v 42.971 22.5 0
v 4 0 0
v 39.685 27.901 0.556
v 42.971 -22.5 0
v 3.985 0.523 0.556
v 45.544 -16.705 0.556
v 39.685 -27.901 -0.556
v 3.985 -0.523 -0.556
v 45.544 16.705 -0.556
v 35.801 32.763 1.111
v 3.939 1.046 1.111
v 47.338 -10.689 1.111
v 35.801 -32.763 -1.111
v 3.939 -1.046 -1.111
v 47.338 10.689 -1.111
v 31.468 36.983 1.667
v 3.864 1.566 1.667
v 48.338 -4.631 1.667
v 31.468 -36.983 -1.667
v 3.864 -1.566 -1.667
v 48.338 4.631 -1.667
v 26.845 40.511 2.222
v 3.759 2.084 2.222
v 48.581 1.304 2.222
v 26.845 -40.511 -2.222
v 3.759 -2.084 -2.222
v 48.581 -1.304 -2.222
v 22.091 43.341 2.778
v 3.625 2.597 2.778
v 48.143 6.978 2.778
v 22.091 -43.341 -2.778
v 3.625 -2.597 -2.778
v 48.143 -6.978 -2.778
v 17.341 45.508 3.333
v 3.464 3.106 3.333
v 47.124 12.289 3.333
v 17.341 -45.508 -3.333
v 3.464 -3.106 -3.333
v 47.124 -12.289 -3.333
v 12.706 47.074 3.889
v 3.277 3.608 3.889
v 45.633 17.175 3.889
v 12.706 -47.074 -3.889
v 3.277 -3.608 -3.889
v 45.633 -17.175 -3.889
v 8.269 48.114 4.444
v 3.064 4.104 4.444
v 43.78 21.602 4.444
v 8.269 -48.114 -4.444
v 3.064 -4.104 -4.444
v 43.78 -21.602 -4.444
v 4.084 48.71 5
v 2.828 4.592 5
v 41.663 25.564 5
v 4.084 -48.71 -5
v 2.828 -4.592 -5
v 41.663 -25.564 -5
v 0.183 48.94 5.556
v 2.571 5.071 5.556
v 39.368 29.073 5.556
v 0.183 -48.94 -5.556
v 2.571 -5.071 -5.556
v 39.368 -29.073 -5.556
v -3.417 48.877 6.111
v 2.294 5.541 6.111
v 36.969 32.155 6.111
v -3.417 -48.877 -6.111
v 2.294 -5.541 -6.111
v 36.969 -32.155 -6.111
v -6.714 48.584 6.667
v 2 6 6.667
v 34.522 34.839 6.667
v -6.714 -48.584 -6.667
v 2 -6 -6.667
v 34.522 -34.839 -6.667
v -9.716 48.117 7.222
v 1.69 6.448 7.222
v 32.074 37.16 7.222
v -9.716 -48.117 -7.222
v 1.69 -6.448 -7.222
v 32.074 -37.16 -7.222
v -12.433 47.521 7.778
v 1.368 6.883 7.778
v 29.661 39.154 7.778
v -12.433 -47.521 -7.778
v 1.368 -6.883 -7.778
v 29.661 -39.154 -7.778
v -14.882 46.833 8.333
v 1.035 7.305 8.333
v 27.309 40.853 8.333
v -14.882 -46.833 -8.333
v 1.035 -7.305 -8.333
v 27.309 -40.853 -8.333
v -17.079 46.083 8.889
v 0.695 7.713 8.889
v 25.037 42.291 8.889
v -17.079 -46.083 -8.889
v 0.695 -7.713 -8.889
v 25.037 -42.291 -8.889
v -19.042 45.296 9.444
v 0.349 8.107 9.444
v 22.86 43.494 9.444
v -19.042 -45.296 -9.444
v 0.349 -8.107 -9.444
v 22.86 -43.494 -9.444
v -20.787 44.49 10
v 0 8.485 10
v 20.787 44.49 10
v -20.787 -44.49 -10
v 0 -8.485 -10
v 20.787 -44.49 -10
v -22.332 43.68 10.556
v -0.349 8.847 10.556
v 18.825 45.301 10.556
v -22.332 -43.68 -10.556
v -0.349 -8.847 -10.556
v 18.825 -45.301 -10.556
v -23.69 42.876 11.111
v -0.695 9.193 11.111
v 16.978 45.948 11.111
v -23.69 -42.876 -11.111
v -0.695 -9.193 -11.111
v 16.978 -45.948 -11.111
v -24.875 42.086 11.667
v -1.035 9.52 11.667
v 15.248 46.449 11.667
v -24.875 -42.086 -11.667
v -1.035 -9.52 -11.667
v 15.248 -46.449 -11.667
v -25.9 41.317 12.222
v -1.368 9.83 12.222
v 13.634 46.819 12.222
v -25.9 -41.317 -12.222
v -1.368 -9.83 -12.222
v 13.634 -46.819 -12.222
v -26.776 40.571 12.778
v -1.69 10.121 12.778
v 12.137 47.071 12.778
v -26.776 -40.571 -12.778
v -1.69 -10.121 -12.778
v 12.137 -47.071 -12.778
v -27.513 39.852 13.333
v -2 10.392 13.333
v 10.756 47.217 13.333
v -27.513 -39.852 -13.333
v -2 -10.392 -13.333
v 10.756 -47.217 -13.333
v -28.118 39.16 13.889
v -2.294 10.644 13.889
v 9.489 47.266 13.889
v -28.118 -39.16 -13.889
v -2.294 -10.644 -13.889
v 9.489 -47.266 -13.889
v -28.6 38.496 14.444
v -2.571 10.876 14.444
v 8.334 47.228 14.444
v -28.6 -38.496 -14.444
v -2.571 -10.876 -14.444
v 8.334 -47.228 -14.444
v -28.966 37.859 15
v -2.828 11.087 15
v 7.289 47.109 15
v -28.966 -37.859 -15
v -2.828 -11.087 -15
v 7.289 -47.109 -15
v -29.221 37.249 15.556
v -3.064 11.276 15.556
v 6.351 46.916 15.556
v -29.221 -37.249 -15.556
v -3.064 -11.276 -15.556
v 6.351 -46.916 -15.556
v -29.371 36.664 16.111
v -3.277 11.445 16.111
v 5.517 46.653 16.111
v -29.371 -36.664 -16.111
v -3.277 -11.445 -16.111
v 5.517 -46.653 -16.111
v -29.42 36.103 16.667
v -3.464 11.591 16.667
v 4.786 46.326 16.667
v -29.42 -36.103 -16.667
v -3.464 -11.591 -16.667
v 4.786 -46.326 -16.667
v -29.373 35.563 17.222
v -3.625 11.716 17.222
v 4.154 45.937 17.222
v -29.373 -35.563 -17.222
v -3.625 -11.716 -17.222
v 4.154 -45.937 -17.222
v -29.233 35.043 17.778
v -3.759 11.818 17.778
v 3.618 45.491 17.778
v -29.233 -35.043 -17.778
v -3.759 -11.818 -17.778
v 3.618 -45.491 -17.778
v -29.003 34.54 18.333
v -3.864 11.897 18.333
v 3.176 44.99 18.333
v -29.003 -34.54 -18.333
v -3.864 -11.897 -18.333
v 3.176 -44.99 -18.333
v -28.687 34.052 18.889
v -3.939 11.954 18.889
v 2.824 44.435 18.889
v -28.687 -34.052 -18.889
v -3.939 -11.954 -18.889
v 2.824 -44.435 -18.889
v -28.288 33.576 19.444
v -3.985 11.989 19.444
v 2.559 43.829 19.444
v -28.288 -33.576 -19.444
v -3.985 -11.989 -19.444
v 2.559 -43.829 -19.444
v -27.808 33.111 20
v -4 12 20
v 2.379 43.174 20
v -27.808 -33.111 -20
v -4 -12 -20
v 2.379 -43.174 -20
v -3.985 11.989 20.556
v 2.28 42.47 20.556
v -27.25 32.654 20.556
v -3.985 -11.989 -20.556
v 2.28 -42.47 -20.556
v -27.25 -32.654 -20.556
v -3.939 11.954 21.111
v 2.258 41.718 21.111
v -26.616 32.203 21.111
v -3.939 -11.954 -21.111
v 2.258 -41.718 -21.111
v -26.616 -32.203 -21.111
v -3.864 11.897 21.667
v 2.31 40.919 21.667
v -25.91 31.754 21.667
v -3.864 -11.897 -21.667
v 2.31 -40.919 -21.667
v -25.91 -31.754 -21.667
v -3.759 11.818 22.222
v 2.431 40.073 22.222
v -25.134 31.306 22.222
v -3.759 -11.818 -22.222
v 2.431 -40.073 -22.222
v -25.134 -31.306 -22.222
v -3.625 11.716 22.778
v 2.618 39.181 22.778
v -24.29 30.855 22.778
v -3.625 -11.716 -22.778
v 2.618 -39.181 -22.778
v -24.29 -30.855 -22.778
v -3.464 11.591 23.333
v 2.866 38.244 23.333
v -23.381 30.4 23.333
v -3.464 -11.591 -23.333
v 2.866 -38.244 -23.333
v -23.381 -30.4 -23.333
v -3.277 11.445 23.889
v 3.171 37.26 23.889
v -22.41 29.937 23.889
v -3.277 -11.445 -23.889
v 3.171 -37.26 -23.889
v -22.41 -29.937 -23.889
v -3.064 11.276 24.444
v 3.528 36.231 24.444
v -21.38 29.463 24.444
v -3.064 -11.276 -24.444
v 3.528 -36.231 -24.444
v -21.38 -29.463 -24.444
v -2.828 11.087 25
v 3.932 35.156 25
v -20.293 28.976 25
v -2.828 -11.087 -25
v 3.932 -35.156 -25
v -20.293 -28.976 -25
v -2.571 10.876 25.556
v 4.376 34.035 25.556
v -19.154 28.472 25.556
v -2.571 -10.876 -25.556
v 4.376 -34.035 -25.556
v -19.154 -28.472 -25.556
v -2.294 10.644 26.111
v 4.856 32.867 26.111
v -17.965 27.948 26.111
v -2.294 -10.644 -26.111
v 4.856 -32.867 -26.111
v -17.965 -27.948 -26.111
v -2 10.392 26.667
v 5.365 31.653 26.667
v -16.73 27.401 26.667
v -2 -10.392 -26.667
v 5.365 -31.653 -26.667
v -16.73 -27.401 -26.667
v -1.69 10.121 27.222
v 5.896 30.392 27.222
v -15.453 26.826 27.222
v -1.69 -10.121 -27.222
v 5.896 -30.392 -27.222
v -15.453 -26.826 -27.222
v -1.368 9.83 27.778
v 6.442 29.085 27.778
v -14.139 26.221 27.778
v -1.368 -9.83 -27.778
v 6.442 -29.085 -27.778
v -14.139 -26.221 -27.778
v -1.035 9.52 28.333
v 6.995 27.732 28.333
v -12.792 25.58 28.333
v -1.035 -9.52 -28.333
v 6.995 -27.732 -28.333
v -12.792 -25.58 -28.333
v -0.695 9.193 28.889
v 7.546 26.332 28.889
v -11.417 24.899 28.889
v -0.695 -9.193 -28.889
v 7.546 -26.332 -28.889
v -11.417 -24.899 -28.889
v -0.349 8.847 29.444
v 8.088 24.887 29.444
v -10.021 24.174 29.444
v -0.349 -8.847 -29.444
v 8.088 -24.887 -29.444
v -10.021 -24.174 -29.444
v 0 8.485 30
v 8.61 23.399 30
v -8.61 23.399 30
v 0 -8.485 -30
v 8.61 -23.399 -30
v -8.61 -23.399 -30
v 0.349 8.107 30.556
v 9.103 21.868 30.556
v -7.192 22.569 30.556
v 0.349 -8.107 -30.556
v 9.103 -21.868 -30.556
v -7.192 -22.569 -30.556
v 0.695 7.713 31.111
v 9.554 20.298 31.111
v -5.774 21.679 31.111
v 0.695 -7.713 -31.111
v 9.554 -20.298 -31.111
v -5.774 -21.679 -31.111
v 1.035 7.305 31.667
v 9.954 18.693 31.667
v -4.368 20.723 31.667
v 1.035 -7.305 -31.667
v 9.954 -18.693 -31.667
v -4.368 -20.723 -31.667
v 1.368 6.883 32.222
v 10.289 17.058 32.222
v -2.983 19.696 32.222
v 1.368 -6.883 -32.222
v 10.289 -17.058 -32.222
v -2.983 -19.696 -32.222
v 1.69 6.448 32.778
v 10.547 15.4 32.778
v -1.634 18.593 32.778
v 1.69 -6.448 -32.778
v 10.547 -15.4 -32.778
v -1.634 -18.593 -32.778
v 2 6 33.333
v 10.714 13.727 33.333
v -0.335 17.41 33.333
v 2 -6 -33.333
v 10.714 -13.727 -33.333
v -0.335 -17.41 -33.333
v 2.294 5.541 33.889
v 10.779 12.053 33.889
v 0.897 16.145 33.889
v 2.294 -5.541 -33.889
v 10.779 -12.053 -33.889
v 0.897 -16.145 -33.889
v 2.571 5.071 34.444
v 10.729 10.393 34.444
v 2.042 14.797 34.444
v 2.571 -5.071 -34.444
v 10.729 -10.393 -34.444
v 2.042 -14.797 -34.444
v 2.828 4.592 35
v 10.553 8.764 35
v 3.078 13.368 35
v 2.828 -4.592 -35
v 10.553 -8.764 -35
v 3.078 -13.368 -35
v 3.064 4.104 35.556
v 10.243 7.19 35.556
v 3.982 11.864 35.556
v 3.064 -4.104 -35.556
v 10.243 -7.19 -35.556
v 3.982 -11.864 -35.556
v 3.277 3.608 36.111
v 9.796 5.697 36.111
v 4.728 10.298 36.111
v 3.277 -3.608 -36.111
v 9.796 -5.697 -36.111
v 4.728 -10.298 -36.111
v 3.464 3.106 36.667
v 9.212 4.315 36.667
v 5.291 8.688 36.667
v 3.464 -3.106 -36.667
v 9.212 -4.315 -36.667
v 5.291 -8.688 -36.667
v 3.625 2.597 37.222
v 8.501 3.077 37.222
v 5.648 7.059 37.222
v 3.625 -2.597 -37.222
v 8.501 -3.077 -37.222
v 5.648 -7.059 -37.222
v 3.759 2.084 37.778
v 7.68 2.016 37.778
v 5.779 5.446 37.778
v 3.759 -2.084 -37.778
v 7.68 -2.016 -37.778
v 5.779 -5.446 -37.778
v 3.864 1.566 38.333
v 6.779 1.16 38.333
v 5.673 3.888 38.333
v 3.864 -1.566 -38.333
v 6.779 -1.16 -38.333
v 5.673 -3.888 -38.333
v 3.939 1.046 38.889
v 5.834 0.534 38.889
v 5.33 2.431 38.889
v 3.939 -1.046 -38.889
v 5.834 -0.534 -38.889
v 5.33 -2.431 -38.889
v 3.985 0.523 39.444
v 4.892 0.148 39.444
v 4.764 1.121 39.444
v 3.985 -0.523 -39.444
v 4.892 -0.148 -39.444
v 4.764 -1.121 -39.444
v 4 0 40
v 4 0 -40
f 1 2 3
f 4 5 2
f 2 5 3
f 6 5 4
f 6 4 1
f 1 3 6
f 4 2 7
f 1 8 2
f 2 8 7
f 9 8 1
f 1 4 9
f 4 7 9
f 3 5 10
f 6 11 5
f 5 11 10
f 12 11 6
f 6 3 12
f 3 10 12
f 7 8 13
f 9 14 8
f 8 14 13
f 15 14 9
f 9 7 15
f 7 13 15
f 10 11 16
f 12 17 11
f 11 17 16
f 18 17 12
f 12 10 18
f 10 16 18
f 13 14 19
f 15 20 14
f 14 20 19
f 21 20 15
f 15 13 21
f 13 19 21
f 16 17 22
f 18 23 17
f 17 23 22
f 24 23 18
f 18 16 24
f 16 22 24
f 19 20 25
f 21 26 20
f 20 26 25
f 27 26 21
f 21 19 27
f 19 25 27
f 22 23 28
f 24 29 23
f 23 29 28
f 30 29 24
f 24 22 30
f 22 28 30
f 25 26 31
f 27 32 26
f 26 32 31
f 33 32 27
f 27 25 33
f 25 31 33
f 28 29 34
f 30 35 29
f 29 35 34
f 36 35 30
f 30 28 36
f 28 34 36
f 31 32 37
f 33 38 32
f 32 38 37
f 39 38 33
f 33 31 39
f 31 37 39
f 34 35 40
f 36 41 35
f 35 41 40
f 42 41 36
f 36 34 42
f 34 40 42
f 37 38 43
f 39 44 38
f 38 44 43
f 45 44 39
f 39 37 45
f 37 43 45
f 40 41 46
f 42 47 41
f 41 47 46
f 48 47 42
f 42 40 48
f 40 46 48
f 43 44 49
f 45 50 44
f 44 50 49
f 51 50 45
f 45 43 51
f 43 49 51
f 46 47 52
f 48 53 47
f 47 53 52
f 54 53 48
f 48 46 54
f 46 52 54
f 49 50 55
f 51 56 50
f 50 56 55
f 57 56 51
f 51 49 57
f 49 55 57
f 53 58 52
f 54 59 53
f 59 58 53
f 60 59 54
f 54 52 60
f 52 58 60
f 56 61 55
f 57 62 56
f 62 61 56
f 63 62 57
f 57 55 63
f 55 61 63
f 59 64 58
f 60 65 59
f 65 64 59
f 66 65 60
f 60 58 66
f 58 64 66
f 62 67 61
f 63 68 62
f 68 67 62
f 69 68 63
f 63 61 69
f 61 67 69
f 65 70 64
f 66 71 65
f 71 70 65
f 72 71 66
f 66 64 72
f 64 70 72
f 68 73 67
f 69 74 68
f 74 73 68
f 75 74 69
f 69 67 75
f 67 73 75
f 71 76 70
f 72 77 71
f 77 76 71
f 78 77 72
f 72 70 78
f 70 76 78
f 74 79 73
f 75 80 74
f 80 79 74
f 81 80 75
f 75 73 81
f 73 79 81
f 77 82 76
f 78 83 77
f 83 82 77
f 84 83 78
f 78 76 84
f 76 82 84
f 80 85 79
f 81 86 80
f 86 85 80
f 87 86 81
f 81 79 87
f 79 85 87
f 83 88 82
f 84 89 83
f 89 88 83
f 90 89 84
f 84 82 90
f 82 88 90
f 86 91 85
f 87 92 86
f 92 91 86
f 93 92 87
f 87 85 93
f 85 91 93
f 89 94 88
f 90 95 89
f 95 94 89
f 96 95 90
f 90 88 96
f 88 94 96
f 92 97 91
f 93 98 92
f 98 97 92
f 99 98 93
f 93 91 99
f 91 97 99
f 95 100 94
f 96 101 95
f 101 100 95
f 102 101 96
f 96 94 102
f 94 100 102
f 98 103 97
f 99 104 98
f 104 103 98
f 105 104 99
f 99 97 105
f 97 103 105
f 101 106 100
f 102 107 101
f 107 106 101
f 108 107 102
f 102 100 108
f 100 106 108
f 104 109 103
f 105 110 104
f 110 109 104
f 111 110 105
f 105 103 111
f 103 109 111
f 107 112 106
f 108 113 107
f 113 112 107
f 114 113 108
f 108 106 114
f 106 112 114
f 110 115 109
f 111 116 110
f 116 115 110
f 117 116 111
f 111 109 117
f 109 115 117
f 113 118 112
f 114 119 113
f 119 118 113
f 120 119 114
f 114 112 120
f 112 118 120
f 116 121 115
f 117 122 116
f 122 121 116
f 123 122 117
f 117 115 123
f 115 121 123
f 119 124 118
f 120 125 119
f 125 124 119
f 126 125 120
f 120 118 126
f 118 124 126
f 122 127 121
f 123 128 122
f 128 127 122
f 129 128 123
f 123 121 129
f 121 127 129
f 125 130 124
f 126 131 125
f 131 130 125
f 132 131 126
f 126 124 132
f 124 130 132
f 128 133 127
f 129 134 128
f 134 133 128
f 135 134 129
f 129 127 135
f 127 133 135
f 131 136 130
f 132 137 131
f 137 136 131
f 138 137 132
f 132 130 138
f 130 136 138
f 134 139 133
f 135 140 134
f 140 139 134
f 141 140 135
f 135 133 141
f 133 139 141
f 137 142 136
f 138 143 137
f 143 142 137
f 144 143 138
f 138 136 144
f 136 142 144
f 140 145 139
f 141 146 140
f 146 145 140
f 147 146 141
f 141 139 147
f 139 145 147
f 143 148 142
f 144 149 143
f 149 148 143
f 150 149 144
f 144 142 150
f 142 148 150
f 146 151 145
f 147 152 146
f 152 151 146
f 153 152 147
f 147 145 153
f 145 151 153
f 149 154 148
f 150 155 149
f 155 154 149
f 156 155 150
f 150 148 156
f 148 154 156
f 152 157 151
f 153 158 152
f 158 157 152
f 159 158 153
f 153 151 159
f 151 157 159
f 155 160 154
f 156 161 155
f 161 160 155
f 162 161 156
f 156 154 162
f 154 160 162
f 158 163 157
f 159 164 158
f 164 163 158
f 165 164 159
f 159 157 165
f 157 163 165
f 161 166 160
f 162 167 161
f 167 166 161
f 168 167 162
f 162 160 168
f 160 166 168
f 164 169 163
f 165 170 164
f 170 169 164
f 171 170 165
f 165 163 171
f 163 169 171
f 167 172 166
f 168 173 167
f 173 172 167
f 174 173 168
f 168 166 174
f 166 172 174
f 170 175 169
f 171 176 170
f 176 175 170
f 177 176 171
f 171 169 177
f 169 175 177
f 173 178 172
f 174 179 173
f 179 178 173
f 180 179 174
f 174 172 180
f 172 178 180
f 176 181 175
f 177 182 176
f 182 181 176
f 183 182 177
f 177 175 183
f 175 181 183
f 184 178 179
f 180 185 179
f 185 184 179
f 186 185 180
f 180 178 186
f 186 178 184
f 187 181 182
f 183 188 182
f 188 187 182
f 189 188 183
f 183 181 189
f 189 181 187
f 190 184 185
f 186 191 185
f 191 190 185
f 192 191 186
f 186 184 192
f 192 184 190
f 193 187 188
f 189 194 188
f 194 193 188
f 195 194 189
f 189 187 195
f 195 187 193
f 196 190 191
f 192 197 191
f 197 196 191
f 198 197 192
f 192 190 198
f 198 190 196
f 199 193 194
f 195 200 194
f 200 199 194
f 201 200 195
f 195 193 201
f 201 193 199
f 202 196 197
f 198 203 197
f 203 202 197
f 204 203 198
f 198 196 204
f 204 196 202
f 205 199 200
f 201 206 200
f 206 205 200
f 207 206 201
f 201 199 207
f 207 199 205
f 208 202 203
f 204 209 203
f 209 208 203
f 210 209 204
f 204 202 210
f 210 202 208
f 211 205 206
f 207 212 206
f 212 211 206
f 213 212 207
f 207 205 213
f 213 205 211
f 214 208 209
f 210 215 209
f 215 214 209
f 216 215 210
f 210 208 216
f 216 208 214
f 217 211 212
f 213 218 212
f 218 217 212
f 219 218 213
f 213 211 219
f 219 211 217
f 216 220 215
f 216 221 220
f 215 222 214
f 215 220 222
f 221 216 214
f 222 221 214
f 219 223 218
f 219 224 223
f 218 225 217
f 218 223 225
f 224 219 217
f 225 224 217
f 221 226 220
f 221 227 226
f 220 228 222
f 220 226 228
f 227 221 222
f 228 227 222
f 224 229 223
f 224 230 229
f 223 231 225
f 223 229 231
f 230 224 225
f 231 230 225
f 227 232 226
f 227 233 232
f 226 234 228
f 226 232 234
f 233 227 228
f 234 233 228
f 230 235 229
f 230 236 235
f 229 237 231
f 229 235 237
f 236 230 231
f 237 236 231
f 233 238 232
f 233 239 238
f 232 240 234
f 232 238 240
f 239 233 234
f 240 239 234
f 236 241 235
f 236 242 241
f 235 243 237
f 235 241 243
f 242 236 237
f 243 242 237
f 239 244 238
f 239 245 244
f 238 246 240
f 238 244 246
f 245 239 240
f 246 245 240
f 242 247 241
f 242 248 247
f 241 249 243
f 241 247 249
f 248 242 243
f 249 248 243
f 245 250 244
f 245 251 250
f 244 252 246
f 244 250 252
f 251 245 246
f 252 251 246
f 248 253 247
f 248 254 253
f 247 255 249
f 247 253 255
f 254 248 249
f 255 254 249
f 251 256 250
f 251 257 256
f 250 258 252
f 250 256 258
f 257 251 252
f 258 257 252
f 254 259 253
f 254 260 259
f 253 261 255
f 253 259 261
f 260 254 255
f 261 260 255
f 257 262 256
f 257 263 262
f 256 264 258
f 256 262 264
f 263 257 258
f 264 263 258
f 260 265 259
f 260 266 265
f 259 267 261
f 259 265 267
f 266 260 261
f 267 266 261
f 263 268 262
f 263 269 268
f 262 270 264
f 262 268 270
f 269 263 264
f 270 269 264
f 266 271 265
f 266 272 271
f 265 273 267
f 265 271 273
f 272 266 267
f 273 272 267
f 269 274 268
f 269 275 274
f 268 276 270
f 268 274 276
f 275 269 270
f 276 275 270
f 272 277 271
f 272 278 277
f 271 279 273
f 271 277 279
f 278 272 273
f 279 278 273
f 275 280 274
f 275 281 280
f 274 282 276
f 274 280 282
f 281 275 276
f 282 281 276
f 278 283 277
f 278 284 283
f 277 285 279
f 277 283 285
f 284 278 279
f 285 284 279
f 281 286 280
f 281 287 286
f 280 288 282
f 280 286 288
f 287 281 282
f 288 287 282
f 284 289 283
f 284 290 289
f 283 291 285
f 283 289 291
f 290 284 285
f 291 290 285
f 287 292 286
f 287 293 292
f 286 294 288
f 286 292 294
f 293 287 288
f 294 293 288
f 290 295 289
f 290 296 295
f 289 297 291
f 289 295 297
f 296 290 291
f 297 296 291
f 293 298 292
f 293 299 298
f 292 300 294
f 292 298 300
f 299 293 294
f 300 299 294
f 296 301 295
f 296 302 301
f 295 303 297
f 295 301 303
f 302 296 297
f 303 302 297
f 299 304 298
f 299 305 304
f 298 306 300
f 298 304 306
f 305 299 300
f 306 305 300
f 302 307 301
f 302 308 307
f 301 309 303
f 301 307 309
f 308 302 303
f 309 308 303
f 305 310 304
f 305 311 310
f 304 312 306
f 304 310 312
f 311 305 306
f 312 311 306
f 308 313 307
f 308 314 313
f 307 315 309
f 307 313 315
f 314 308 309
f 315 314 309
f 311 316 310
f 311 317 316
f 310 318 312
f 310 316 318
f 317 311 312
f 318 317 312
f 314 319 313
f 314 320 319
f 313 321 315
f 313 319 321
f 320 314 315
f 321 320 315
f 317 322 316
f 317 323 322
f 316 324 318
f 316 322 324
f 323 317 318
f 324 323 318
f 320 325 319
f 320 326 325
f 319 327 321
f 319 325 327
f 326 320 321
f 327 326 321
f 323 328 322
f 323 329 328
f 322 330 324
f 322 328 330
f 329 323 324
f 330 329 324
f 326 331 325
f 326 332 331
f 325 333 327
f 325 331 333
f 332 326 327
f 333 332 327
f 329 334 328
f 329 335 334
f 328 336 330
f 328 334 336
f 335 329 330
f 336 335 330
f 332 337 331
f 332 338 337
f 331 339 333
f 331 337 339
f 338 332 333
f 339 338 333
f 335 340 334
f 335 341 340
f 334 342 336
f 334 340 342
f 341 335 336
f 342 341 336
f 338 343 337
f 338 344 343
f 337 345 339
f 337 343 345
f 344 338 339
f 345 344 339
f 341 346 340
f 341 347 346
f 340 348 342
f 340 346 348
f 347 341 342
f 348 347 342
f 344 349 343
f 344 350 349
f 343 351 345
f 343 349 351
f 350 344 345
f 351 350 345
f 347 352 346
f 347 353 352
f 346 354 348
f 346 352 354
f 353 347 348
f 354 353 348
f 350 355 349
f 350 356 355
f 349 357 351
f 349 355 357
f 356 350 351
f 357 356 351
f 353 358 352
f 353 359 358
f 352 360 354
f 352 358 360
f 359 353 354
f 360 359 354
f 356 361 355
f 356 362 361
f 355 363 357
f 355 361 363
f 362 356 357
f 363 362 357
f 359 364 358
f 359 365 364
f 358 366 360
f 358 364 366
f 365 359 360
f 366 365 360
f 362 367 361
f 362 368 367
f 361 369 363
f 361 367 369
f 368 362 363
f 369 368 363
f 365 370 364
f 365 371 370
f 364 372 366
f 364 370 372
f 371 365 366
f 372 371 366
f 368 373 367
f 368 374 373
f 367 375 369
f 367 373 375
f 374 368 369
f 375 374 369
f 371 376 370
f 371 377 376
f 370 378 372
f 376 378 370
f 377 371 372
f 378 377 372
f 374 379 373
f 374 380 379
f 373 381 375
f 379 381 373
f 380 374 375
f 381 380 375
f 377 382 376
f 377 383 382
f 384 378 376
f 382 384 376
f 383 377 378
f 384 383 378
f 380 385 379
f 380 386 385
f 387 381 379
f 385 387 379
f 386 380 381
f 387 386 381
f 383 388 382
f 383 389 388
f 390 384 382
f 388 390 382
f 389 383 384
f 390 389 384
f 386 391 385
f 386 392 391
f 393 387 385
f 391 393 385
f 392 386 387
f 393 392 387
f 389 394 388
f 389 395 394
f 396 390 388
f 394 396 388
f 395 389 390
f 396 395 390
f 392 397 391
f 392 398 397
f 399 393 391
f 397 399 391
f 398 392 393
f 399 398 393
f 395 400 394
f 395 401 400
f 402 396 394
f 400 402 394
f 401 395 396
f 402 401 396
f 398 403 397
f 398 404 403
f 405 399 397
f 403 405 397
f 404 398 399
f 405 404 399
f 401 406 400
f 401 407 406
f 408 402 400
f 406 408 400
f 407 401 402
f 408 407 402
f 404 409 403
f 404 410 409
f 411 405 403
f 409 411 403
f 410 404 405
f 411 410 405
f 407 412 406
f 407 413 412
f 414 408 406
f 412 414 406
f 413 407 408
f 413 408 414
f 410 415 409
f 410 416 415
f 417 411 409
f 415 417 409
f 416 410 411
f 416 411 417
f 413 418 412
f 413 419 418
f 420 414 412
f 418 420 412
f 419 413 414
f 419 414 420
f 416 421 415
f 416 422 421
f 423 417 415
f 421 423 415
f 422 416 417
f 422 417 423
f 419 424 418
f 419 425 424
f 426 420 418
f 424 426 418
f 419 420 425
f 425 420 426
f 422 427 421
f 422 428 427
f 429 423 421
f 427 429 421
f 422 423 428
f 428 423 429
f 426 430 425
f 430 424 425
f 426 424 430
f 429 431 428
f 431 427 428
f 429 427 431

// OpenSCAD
scale=2.5;

steps=72;

module slice(Xa, Ya, Za, Xb, Yb, Zb, radiusa, radiusb, bend)
{	
	angleZ=atan2(Ya, Xa);
	twistZ=atan2(Yb, Xb)-atan2(Ya, Xa);

	polyPoints=[
		[Xa,						Ya,					Za ],
		[Xa+ radiusa*cos(30+angleZ),		Ya+ radiusa*sin(30+angleZ),	Za ],
		[Xa+ radiusa*cos(-30+angleZ),	Ya+ radiusa*sin(-30+angleZ),	Za ],
	
		[Xb,							Yb,							Zb ],
		[Xb+ radiusb*cos(30+angleZ+twistZ),	Yb+ radiusb*sin(30+angleZ+twistZ),		Zb+ radiusb*sin(bend) ],
		[Xb+ radiusb*cos(-30+angleZ+twistZ),	Yb+ radiusb*sin(-30+angleZ+twistZ),	Zb+ radiusb*sin(bend)] ];
	
	polyTriangles=[
		[ 0, 2, 1 ],
	
		[ 3, 2, 0], [ 2, 3, 5],
	
		[ 4, 0, 1], [ 0, 4, 3],
	
		[ 5, 1, 2], [ 1, 5, 4],
	
		[ 3, 4, 5 ]
		 ];
	
	polyhedron( polyPoints, polyTriangles );
}

function 	X(i)=		4*cos(i*360);
function 	Y(i)=		12*sin(i*180);
function 	Z(i)=		40*i;
function 	size(i)=	18*scale*cos(i*90);

module corkscrew()
{
	for (i=[0:steps-1])
	{
		slice(
			Xa=		X(i/steps),
			Ya=		Y(i/steps),
			Za=		Z(i/steps),
			Xb=		X((i+1)/steps),
			Yb=		Y((i+1)/steps), 
			Zb=		Z((i+1)/steps), 
			radiusa=	size(i/steps), 
			radiusb=	size((i+1)/steps),
			bend=	0
			);
	
		rotate([180,0,0])
		slice(
			Xa=		X(i/steps),
			Ya=		Y(i/steps),
			Za=		Z(i/steps),
			Xb=		X((i+1)/steps),
			Yb=		Y((i+1)/steps), 
			Zb=		Z((i+1)/steps), 
			radiusa=	size(i/steps), 
			radiusb=	size((i+1)/steps),
			bend=	0
			);
	}
}

corkscrew();
